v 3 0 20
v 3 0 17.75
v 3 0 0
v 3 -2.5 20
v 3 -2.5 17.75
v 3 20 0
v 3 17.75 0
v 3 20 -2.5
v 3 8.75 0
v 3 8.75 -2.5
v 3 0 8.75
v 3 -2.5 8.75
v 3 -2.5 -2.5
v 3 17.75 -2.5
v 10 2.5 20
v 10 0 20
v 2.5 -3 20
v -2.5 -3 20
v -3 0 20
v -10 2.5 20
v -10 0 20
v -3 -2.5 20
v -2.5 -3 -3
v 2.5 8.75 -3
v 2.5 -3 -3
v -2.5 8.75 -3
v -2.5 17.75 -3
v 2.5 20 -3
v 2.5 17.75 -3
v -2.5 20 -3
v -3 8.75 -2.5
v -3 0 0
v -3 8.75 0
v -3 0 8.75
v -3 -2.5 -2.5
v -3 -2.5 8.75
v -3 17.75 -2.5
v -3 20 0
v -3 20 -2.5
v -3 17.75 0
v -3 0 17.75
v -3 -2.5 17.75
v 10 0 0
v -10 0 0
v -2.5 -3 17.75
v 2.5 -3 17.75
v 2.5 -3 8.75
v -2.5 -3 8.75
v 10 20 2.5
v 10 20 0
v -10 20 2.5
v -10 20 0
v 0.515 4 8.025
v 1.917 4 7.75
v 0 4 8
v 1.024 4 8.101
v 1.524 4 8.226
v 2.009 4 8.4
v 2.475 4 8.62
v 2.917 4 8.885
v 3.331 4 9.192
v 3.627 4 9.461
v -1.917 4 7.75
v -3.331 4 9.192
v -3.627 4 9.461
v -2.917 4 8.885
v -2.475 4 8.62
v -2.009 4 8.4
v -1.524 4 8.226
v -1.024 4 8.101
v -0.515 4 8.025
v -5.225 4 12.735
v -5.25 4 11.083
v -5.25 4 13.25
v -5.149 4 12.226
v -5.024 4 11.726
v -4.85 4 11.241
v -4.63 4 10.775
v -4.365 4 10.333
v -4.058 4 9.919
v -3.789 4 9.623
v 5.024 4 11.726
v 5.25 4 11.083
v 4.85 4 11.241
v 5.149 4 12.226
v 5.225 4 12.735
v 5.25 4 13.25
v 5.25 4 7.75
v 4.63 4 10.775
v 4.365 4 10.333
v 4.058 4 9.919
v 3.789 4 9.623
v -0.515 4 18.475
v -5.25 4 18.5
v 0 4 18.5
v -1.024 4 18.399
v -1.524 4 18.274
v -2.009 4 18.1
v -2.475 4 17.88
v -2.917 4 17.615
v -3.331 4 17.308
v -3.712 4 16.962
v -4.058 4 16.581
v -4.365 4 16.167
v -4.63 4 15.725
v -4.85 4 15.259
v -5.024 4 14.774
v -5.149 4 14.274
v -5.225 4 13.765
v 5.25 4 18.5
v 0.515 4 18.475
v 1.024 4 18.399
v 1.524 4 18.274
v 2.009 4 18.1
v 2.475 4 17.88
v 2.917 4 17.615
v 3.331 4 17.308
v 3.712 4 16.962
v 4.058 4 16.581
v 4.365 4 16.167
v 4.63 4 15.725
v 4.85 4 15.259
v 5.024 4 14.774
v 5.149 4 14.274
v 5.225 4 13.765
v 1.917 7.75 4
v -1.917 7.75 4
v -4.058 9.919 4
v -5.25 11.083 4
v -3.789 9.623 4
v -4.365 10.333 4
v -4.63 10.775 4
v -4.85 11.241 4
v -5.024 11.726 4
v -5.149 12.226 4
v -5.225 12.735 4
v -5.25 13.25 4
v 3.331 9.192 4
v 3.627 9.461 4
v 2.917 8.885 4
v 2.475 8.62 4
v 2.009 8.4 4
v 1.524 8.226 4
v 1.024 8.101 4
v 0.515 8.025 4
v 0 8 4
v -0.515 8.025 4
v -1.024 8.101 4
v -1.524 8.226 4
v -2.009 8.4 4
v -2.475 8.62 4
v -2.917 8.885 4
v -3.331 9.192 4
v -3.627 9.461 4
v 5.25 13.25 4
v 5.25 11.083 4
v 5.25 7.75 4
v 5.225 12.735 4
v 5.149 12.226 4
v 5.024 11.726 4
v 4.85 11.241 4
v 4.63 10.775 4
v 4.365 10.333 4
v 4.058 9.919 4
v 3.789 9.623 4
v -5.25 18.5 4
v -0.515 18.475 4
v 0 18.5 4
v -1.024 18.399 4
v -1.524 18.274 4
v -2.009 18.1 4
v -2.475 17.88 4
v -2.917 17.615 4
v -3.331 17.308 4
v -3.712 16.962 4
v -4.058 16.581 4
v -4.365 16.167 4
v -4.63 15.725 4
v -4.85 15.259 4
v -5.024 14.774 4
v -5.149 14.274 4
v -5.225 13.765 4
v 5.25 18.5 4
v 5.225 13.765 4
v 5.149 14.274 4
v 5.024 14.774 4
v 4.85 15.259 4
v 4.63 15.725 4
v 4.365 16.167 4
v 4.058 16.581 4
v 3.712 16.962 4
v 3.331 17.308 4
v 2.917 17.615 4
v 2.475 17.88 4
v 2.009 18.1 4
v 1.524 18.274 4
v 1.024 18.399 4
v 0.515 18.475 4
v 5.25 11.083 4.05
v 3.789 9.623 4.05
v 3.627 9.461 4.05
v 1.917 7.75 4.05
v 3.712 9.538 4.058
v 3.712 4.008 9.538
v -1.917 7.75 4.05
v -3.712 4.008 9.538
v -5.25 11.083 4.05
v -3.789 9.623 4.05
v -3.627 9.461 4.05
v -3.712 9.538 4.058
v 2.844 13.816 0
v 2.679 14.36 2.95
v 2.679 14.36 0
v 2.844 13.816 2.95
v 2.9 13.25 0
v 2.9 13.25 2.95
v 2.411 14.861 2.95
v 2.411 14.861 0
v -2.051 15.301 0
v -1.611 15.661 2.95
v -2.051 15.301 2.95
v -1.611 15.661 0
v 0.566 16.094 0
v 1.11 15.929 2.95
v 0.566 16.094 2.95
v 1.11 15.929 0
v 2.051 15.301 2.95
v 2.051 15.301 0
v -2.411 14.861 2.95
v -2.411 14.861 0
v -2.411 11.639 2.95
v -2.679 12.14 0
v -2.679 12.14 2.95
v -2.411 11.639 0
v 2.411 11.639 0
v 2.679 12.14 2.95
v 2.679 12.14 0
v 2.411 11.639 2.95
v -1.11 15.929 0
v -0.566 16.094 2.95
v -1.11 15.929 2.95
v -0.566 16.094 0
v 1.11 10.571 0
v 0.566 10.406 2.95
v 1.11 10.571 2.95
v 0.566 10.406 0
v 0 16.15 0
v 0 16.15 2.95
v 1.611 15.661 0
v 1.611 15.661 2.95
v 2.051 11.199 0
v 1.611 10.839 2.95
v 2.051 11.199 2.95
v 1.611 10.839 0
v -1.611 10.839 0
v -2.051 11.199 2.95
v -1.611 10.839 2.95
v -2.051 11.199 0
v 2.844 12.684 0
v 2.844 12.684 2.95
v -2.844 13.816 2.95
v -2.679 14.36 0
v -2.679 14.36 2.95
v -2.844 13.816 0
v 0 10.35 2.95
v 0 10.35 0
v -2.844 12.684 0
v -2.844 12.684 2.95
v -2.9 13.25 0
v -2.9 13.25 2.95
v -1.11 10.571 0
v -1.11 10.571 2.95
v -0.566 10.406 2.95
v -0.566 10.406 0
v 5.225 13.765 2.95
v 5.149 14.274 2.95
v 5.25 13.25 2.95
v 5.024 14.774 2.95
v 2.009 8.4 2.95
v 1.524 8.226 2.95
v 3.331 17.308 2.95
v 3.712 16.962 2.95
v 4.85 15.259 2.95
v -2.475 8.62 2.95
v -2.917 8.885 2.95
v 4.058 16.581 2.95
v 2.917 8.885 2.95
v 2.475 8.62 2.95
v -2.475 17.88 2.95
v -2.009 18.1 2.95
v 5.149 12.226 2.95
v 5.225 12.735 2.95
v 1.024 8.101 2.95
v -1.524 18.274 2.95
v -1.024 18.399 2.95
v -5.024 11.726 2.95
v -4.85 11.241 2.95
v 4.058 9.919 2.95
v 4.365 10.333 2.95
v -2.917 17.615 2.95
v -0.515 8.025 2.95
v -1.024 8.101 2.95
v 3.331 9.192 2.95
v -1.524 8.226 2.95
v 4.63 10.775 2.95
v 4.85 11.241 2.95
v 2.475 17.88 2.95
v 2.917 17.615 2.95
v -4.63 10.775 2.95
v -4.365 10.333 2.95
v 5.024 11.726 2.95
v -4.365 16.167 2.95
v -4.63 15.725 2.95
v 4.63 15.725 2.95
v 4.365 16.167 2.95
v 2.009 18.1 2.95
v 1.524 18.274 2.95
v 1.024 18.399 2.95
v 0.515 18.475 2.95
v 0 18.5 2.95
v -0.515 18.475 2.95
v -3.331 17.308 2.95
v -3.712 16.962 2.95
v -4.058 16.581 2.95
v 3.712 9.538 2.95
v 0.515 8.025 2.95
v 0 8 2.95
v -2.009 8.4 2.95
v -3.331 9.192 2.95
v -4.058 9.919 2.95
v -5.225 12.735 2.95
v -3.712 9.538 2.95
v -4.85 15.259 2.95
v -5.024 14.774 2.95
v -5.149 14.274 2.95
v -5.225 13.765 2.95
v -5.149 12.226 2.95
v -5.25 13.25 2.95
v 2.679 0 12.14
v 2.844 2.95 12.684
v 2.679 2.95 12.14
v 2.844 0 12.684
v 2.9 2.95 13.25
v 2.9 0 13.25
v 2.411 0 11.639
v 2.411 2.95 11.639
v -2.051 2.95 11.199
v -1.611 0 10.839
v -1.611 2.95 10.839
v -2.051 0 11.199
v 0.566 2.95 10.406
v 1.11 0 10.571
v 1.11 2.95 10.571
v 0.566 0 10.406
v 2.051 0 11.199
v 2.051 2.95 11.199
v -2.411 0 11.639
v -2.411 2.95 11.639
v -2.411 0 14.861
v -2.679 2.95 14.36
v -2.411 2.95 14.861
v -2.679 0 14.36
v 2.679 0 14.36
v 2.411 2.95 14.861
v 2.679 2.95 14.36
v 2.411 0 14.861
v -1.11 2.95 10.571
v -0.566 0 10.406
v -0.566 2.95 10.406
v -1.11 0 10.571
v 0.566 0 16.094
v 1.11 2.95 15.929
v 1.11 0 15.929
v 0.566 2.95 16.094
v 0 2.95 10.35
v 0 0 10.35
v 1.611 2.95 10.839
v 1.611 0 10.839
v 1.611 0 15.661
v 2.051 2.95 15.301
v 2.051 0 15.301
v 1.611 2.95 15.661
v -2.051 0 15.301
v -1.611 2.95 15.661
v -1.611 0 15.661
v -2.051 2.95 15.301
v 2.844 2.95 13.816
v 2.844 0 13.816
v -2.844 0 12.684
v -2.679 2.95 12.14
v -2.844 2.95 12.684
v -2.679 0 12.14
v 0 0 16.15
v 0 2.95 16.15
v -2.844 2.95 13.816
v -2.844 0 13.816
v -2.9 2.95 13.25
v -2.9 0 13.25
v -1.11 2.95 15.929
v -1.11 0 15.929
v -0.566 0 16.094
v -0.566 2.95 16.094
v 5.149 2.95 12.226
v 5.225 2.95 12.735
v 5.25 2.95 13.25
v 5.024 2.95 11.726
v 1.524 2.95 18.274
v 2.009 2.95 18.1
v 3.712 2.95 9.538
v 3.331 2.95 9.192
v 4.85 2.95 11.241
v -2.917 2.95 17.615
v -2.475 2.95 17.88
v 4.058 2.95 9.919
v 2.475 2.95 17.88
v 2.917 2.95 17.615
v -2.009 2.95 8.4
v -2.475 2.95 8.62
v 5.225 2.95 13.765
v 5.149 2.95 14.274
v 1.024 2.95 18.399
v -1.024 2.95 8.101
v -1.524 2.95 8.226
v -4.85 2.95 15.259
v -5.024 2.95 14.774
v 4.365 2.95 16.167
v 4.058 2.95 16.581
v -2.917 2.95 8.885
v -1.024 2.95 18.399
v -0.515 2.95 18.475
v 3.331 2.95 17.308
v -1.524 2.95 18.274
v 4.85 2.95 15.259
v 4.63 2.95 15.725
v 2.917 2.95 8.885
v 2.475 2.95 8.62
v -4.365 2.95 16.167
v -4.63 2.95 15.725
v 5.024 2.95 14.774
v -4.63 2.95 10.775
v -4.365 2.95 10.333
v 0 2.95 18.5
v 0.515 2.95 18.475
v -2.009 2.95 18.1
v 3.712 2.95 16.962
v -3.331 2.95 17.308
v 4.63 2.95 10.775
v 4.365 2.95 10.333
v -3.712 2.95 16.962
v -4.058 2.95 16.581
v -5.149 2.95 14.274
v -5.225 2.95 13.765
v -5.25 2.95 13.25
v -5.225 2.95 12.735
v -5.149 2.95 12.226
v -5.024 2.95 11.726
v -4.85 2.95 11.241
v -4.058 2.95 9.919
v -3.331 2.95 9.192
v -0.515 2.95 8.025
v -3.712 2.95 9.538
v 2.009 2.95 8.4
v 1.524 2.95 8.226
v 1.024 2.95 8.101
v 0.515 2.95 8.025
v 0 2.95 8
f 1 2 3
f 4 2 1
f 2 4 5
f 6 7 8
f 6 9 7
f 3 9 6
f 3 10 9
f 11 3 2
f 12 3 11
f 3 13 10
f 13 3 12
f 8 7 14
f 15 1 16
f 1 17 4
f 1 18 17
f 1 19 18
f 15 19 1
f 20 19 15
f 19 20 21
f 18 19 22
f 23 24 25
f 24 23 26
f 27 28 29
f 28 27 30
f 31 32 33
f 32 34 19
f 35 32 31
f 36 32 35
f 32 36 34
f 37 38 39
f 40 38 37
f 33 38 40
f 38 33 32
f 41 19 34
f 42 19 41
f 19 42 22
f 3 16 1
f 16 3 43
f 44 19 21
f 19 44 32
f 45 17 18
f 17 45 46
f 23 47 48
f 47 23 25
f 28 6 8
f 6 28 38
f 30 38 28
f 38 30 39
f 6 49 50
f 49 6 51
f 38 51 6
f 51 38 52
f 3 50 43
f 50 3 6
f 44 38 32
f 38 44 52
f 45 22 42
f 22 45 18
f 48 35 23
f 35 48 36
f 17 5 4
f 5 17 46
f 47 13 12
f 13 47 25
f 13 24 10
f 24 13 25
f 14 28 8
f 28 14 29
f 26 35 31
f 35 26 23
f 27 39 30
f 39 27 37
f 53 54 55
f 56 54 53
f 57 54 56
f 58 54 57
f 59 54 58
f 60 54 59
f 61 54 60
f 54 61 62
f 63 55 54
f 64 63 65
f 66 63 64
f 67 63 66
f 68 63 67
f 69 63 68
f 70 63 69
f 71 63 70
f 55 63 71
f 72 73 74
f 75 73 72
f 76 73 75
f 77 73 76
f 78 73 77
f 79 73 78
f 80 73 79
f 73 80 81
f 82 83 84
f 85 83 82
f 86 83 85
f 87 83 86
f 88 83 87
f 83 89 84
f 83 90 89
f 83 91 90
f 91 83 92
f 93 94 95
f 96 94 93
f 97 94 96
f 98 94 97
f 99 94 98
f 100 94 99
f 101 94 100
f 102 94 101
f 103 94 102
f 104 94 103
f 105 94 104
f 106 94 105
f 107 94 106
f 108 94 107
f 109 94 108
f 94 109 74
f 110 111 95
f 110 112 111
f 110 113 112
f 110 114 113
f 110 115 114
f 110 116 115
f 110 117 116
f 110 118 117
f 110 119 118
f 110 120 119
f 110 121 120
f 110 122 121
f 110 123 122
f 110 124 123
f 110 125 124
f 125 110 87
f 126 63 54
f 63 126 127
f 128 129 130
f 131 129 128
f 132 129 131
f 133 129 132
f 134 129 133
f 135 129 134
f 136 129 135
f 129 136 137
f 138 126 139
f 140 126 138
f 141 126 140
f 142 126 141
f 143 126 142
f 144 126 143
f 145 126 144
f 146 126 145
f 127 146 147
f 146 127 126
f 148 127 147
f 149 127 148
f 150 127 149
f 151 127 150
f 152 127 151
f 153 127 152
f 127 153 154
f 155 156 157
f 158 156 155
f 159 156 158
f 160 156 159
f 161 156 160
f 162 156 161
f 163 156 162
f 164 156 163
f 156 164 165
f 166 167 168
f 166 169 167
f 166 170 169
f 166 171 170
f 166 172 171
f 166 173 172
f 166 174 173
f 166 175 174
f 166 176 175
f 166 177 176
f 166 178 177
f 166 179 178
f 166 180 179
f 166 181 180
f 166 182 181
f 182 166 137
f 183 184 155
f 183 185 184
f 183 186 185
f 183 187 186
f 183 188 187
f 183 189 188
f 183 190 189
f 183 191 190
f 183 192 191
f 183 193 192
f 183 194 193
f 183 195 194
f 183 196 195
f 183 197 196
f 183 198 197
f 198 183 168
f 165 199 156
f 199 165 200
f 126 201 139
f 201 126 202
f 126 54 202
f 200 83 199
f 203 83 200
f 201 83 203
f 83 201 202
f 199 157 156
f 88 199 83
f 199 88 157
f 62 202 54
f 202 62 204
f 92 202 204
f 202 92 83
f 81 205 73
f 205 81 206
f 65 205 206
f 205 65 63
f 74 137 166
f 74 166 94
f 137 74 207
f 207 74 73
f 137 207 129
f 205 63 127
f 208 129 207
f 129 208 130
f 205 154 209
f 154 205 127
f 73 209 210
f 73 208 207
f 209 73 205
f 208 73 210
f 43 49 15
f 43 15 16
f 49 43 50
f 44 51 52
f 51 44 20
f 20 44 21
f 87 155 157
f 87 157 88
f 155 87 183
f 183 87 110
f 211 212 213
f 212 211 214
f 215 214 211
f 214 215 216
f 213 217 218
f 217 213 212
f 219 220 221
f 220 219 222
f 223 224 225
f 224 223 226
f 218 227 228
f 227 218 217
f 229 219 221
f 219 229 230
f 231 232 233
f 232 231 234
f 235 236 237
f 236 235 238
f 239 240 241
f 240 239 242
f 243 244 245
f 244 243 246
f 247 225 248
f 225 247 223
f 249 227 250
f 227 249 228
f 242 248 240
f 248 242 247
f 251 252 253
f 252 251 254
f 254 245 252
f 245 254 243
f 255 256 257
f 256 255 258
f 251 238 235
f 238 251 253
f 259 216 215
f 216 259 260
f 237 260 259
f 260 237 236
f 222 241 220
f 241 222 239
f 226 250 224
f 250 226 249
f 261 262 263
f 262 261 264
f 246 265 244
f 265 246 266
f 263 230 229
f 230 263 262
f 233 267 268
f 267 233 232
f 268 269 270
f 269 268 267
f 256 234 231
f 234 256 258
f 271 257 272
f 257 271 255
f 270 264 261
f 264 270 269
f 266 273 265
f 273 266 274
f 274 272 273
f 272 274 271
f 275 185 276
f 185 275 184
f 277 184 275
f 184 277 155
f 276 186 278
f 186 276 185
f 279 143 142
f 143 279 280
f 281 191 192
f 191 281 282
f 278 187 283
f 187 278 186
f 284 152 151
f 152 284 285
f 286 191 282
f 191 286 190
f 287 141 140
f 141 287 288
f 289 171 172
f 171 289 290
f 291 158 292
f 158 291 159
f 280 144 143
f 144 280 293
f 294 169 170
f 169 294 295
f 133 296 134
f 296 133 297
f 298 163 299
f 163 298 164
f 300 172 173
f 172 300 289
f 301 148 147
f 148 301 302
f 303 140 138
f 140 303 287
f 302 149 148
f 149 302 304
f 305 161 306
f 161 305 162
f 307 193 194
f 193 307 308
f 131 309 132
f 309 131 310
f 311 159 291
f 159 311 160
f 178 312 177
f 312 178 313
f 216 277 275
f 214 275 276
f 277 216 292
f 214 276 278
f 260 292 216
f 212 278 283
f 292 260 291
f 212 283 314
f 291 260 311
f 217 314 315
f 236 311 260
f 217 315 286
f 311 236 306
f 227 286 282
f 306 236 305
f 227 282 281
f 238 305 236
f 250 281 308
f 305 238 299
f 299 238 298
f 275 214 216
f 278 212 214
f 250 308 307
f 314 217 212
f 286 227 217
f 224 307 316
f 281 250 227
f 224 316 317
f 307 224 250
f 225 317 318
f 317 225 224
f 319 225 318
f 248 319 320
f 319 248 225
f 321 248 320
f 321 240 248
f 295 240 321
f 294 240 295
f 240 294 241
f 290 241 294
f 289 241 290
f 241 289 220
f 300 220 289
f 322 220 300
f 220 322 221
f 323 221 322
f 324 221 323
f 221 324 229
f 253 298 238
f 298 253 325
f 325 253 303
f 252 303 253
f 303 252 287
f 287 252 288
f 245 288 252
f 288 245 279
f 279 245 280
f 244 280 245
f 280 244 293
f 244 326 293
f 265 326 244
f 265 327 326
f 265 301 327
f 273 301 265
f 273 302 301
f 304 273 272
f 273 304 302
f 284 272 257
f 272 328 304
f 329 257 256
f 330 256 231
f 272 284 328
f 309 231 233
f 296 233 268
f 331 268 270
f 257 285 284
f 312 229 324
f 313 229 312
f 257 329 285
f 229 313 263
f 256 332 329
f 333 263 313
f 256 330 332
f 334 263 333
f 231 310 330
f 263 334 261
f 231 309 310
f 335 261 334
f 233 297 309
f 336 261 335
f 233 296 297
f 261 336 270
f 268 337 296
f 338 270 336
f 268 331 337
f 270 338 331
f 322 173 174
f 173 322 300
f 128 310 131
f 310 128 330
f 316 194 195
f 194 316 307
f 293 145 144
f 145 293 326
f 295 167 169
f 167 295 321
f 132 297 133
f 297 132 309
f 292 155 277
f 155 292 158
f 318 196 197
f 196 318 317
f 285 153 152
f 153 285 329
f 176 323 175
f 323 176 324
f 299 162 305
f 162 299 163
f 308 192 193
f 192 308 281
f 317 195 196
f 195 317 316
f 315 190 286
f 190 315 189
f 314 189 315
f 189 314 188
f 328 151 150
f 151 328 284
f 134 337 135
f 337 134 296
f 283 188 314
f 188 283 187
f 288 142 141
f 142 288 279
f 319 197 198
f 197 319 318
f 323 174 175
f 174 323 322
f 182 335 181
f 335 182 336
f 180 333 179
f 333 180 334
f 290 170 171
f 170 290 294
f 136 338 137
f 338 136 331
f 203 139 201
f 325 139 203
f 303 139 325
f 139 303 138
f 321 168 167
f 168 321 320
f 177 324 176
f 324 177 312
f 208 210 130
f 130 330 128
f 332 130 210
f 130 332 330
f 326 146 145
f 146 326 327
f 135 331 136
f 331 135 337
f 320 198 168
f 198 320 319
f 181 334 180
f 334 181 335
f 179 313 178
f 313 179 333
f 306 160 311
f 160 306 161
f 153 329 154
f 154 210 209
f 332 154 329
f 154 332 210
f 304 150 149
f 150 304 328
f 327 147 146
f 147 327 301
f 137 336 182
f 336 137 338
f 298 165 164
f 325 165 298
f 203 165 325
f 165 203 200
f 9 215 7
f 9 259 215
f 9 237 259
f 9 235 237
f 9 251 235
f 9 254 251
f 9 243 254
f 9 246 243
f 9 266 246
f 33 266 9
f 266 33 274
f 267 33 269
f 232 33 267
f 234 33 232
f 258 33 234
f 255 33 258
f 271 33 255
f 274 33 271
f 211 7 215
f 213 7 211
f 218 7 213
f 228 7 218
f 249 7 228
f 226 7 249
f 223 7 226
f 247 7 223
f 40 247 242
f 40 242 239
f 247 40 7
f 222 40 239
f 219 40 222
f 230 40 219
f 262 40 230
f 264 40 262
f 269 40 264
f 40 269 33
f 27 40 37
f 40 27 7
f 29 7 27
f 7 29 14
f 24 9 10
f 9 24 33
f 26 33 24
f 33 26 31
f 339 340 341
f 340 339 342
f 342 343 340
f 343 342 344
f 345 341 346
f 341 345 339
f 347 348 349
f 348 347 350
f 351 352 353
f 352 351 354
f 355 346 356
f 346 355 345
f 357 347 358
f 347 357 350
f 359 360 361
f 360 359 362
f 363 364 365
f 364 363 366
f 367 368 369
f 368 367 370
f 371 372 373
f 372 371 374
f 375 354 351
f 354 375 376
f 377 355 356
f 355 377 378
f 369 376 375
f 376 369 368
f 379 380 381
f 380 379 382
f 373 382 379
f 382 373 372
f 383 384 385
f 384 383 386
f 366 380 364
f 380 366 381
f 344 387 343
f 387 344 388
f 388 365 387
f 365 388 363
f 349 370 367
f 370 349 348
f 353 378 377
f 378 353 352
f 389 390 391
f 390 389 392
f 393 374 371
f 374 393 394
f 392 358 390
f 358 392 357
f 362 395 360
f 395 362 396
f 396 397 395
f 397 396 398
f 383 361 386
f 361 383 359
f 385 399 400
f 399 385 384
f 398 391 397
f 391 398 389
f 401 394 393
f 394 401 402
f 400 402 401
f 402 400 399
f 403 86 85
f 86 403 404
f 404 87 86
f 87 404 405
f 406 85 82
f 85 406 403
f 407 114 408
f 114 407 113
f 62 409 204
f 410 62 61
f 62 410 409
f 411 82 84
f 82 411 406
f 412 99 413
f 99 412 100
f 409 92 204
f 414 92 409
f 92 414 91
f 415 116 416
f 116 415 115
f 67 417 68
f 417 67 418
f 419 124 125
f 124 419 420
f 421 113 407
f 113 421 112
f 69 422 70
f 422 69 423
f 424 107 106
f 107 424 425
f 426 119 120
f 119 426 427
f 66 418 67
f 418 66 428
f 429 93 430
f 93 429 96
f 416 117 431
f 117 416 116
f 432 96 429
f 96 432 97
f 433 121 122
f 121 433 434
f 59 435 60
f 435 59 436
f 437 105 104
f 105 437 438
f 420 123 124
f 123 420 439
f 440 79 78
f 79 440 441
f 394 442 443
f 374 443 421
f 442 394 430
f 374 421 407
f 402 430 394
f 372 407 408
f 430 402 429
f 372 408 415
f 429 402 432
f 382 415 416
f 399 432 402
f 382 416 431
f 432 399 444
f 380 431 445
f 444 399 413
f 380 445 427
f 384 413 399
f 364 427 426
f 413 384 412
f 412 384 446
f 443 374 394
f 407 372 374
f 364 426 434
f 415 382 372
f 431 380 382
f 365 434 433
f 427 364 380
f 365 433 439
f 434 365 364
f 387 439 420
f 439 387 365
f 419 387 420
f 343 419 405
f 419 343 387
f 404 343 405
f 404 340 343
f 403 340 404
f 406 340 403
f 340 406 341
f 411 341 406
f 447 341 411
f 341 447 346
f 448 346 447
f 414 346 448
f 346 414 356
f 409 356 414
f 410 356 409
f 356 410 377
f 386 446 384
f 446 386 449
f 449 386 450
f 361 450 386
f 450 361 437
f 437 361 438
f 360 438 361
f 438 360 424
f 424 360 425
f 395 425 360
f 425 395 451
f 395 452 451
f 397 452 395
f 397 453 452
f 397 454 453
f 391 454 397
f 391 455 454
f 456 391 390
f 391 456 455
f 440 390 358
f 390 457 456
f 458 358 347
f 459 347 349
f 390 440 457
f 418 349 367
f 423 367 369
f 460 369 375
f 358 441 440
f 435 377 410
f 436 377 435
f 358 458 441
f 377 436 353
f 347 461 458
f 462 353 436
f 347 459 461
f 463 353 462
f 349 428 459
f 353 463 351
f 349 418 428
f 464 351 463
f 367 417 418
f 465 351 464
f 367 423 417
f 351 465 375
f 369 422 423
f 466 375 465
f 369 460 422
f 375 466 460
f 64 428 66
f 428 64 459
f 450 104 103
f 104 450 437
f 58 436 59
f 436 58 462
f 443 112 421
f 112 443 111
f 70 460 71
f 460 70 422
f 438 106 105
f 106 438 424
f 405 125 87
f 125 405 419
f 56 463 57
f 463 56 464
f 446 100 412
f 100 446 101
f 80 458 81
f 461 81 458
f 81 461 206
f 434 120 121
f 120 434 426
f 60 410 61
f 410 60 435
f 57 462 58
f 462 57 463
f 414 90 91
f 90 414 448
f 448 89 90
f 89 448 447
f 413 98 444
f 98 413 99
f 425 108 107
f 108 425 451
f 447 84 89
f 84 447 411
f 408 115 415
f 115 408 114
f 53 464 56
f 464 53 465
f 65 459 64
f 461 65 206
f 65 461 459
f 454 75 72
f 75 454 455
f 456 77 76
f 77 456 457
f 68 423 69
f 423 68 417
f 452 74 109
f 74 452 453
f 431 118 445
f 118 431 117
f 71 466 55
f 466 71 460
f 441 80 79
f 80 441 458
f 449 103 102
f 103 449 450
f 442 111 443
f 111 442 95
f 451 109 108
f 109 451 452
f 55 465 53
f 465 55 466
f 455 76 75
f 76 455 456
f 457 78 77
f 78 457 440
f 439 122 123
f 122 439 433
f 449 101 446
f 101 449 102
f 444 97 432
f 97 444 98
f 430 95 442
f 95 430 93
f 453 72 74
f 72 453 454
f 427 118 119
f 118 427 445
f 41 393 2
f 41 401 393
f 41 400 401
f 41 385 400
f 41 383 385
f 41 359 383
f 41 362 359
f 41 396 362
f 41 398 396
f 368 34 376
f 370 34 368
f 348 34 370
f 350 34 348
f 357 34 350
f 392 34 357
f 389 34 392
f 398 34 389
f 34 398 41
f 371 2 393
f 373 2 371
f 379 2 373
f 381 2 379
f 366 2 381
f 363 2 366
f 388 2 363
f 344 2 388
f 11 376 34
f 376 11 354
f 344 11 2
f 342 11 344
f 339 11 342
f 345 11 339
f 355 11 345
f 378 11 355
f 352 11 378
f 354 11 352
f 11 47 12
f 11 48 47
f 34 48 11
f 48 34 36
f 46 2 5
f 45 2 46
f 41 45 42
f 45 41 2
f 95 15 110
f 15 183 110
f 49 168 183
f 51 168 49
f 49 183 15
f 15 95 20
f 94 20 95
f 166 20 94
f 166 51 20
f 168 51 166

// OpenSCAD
/*
* Ultimate Customizable Corner Brackets
* https://www.thingiverse.com/thing:3007147
* Version 1.0
* 2018-07-21
*/


// The width of your aluminium extrusion
extrusion_width = 20;

// The side length of the bracket
side_length = 20;
// The thickness of the parts you screw into
side_thickness = 4;

// How many screws should be used to fasten this to the extrusions. Should be even.
screw_count = 2;
// Screw diameter (4 for M4, 5 for M5 and so on)
screw_hole_size = 5;
// Screw head diameter
screw_head_size = 10;
// How deep screw heads should be recessed. Obviously don't make this larger than side_thickness.
recessed_screw_depth = 1;

// The part which goes into your extrusion. Generally this should be slightly smaller than the actual hole, but YMMV.
extrusion_insert_width = 6;

// Use this when you want multiple connected brackets, for 4020 and similar. 20 for 2020 extrusions, 30 for 3030 and so on.
extrusion_base = 20;

// Set to true if you only want a single wall. Not compatible with multiple bracket mode
single_wall_mode = false;

// Set lower if you think the side walls are too thick
max_wall_thickness = 8;





/**********************************
   End of config, here be dragons
**********************************/








// This works for typical hammer nuts, increase if needed
bottom_nut_space = screw_hole_size + 4;

// You might want to decrease this if you don't use hammer nuts
extrusion_insert_height = 3;

screw_head_margin = 0.5;
e = 0.05;
screw_distance_from_edge = max(screw_head_size / 2 + 1.5, 6.5) + screw_head_margin/2;
bridge_size = screw_count > 2
    ? (side_length - side_thickness - 2*screw_head_size) / (side_length/20)
    : side_length - screw_distance_from_edge - screw_head_size / 2 - side_thickness - screw_head_margin;

main();

module main() {
    bracket_count = floor(extrusion_width / extrusion_base);
    extrusion_width = extrusion_width/bracket_count;
    wall_thickness = min([max_wall_thickness, (extrusion_width - screw_head_size - screw_head_margin) / 2]);
    union() {
        for(i=[0:bracket_count-1]) {
            translate([i*extrusion_width, 0, 0]) bracket(extrusion_width, wall_thickness);
        }
    }
}

module bracket(width, wall_thickness, is_first) {
    screw_total_distance = side_length - screw_distance_from_edge - bridge_size - side_thickness - screw_head_size/2 - screw_head_margin;
    screw_distance = screw_total_distance/(max(1, screw_count/2-1));
    
    difference() {
        union() {
            translate([-width/2, 0, 0]) cube([width, side_length, side_thickness]); // Bottom wall
            translate([-width/2, side_thickness, 0]) rotate([90, 0, 0]) cube([width, side_length, side_thickness]); // Top wall
            translate([width/2 - wall_thickness, 0, 0]) rotate([90, 0, 90]) wall(width, side_length, wall_thickness); // Left wall
            if(!single_wall_mode) {
                translate([-width/2, 0, 0]) rotate([90, 0, 90]) wall(width, side_length, wall_thickness); // Right wall
            }
            
            // Make the parts which go into the extrusions, with chamfers
            difference() {
                union() {
                    extrusion_insert();
                    translate([0, 0, 0]) rotate([90, 0, 180]) extrusion_insert();
                }
                extrusion_chamfer();
                translate([0, 0, 0]) rotate([90, 0, 180]) extrusion_chamfer();
            }
            bridge(bridge_size, width, wall_thickness);
        };
        translate([-width/2 - e, side_length + side_thickness - 1.5, 0]) rotate([45, 0, 0]) cube([width + e * 2, side_length, side_length*2]); // Cutoff for better printing
        
        // Make screw holes
        for(i=[0:screw_count/2-1]) {
            translate([0, side_length - screw_distance_from_edge - i*screw_distance, -e]) screw(screw_hole_size, screw_head_size); // Bottom screw
            translate([0, -e, side_length - screw_distance_from_edge - i*screw_distance]) rotate([270, 0, 0]) screw(screw_hole_size, screw_head_size); // Top screw
        }
    }
}

module wall(w, l, wall_thickness) {
    linear_extrude(height = wall_thickness, convexity = 2) polygon(points = [[side_thickness, side_thickness], [side_length, side_thickness], [side_thickness, side_length]]);
}

module screw(hole_size, head_size) {
    translate([0,0,-0.5]) cylinder(h = side_thickness + 1, r = hole_size / 2 + 0.4, $fn = 32); // Screw hole
    if(recessed_screw_depth != 0){
        translate([0, 0, side_thickness - recessed_screw_depth]) cylinder(h = recessed_screw_depth+1, r = (head_size + screw_head_margin)/2, $fn = 64);
    }
    translate([-extrusion_insert_width/2-e, -bottom_nut_space/2, -extrusion_insert_height-e]) cube([extrusion_insert_width + 2*e, bottom_nut_space,extrusion_insert_height+2*e]); // Remove extrusion insert below screw
    #translate([0, 0, side_thickness]) cylinder(h = 3, r = head_size / 2, $fn = 32); // Screw head, to make sure they don't hit each other
}

module bridge(size, width, wall_thickness) {
    right = width - 2*wall_thickness + 2;
    c = screw_head_size / 3;
    top = size + c;
    x = width/2-wall_thickness-c;
    union() {
        translate([width/2 - e, 0, 0])
            rotate([0, 270, 0])
            linear_extrude(height = width - 2*e, convexity = 2)
            polygon([[side_thickness, side_thickness], [side_thickness + size, side_thickness], [side_thickness, side_thickness + size]]); // Main bridge
        translate([width/2-wall_thickness-c, 0, 0])
            bridge_side(size, [[0, 0], [c, 0], [c, c]]); // Left
        if(!single_wall_mode) {
            translate([-width/2+wall_thickness, 0, 0])
                bridge_side(size, [[0, 0], [c, 0], [0, c]]); // Right
        }
    }
}

module bridge_side(size, polygon_points){
    hull() {
        translate([0, size+side_thickness, side_thickness]) linear_extrude(height = e, convexity = 2) polygon(points = polygon_points);
        translate([0, side_thickness, size+side_thickness]) rotate([90,0,0]) linear_extrude(height = e, convexity = 2) polygon(points = polygon_points);
    }
}

module extrusion_insert() {
    translate([-extrusion_insert_width/2, -extrusion_insert_height, -extrusion_insert_height]) cube([extrusion_insert_width, extrusion_insert_height, side_length + extrusion_insert_height]);
}

module extrusion_chamfer(height = .5) {
    x = extrusion_insert_width;
    z = side_length + extrusion_insert_height;
    length = sqrt(height * height * 2);
    translate([-extrusion_insert_width/2, -extrusion_insert_height, -extrusion_insert_height]) union() {
        translate([0, -height, -e]) rotate([0, 0, 45]) cube([length, length, z+2*e]);
        translate([x, -height, -e]) rotate([0, 0, 45]) cube([length, length, z+2*e]);
    }
}
